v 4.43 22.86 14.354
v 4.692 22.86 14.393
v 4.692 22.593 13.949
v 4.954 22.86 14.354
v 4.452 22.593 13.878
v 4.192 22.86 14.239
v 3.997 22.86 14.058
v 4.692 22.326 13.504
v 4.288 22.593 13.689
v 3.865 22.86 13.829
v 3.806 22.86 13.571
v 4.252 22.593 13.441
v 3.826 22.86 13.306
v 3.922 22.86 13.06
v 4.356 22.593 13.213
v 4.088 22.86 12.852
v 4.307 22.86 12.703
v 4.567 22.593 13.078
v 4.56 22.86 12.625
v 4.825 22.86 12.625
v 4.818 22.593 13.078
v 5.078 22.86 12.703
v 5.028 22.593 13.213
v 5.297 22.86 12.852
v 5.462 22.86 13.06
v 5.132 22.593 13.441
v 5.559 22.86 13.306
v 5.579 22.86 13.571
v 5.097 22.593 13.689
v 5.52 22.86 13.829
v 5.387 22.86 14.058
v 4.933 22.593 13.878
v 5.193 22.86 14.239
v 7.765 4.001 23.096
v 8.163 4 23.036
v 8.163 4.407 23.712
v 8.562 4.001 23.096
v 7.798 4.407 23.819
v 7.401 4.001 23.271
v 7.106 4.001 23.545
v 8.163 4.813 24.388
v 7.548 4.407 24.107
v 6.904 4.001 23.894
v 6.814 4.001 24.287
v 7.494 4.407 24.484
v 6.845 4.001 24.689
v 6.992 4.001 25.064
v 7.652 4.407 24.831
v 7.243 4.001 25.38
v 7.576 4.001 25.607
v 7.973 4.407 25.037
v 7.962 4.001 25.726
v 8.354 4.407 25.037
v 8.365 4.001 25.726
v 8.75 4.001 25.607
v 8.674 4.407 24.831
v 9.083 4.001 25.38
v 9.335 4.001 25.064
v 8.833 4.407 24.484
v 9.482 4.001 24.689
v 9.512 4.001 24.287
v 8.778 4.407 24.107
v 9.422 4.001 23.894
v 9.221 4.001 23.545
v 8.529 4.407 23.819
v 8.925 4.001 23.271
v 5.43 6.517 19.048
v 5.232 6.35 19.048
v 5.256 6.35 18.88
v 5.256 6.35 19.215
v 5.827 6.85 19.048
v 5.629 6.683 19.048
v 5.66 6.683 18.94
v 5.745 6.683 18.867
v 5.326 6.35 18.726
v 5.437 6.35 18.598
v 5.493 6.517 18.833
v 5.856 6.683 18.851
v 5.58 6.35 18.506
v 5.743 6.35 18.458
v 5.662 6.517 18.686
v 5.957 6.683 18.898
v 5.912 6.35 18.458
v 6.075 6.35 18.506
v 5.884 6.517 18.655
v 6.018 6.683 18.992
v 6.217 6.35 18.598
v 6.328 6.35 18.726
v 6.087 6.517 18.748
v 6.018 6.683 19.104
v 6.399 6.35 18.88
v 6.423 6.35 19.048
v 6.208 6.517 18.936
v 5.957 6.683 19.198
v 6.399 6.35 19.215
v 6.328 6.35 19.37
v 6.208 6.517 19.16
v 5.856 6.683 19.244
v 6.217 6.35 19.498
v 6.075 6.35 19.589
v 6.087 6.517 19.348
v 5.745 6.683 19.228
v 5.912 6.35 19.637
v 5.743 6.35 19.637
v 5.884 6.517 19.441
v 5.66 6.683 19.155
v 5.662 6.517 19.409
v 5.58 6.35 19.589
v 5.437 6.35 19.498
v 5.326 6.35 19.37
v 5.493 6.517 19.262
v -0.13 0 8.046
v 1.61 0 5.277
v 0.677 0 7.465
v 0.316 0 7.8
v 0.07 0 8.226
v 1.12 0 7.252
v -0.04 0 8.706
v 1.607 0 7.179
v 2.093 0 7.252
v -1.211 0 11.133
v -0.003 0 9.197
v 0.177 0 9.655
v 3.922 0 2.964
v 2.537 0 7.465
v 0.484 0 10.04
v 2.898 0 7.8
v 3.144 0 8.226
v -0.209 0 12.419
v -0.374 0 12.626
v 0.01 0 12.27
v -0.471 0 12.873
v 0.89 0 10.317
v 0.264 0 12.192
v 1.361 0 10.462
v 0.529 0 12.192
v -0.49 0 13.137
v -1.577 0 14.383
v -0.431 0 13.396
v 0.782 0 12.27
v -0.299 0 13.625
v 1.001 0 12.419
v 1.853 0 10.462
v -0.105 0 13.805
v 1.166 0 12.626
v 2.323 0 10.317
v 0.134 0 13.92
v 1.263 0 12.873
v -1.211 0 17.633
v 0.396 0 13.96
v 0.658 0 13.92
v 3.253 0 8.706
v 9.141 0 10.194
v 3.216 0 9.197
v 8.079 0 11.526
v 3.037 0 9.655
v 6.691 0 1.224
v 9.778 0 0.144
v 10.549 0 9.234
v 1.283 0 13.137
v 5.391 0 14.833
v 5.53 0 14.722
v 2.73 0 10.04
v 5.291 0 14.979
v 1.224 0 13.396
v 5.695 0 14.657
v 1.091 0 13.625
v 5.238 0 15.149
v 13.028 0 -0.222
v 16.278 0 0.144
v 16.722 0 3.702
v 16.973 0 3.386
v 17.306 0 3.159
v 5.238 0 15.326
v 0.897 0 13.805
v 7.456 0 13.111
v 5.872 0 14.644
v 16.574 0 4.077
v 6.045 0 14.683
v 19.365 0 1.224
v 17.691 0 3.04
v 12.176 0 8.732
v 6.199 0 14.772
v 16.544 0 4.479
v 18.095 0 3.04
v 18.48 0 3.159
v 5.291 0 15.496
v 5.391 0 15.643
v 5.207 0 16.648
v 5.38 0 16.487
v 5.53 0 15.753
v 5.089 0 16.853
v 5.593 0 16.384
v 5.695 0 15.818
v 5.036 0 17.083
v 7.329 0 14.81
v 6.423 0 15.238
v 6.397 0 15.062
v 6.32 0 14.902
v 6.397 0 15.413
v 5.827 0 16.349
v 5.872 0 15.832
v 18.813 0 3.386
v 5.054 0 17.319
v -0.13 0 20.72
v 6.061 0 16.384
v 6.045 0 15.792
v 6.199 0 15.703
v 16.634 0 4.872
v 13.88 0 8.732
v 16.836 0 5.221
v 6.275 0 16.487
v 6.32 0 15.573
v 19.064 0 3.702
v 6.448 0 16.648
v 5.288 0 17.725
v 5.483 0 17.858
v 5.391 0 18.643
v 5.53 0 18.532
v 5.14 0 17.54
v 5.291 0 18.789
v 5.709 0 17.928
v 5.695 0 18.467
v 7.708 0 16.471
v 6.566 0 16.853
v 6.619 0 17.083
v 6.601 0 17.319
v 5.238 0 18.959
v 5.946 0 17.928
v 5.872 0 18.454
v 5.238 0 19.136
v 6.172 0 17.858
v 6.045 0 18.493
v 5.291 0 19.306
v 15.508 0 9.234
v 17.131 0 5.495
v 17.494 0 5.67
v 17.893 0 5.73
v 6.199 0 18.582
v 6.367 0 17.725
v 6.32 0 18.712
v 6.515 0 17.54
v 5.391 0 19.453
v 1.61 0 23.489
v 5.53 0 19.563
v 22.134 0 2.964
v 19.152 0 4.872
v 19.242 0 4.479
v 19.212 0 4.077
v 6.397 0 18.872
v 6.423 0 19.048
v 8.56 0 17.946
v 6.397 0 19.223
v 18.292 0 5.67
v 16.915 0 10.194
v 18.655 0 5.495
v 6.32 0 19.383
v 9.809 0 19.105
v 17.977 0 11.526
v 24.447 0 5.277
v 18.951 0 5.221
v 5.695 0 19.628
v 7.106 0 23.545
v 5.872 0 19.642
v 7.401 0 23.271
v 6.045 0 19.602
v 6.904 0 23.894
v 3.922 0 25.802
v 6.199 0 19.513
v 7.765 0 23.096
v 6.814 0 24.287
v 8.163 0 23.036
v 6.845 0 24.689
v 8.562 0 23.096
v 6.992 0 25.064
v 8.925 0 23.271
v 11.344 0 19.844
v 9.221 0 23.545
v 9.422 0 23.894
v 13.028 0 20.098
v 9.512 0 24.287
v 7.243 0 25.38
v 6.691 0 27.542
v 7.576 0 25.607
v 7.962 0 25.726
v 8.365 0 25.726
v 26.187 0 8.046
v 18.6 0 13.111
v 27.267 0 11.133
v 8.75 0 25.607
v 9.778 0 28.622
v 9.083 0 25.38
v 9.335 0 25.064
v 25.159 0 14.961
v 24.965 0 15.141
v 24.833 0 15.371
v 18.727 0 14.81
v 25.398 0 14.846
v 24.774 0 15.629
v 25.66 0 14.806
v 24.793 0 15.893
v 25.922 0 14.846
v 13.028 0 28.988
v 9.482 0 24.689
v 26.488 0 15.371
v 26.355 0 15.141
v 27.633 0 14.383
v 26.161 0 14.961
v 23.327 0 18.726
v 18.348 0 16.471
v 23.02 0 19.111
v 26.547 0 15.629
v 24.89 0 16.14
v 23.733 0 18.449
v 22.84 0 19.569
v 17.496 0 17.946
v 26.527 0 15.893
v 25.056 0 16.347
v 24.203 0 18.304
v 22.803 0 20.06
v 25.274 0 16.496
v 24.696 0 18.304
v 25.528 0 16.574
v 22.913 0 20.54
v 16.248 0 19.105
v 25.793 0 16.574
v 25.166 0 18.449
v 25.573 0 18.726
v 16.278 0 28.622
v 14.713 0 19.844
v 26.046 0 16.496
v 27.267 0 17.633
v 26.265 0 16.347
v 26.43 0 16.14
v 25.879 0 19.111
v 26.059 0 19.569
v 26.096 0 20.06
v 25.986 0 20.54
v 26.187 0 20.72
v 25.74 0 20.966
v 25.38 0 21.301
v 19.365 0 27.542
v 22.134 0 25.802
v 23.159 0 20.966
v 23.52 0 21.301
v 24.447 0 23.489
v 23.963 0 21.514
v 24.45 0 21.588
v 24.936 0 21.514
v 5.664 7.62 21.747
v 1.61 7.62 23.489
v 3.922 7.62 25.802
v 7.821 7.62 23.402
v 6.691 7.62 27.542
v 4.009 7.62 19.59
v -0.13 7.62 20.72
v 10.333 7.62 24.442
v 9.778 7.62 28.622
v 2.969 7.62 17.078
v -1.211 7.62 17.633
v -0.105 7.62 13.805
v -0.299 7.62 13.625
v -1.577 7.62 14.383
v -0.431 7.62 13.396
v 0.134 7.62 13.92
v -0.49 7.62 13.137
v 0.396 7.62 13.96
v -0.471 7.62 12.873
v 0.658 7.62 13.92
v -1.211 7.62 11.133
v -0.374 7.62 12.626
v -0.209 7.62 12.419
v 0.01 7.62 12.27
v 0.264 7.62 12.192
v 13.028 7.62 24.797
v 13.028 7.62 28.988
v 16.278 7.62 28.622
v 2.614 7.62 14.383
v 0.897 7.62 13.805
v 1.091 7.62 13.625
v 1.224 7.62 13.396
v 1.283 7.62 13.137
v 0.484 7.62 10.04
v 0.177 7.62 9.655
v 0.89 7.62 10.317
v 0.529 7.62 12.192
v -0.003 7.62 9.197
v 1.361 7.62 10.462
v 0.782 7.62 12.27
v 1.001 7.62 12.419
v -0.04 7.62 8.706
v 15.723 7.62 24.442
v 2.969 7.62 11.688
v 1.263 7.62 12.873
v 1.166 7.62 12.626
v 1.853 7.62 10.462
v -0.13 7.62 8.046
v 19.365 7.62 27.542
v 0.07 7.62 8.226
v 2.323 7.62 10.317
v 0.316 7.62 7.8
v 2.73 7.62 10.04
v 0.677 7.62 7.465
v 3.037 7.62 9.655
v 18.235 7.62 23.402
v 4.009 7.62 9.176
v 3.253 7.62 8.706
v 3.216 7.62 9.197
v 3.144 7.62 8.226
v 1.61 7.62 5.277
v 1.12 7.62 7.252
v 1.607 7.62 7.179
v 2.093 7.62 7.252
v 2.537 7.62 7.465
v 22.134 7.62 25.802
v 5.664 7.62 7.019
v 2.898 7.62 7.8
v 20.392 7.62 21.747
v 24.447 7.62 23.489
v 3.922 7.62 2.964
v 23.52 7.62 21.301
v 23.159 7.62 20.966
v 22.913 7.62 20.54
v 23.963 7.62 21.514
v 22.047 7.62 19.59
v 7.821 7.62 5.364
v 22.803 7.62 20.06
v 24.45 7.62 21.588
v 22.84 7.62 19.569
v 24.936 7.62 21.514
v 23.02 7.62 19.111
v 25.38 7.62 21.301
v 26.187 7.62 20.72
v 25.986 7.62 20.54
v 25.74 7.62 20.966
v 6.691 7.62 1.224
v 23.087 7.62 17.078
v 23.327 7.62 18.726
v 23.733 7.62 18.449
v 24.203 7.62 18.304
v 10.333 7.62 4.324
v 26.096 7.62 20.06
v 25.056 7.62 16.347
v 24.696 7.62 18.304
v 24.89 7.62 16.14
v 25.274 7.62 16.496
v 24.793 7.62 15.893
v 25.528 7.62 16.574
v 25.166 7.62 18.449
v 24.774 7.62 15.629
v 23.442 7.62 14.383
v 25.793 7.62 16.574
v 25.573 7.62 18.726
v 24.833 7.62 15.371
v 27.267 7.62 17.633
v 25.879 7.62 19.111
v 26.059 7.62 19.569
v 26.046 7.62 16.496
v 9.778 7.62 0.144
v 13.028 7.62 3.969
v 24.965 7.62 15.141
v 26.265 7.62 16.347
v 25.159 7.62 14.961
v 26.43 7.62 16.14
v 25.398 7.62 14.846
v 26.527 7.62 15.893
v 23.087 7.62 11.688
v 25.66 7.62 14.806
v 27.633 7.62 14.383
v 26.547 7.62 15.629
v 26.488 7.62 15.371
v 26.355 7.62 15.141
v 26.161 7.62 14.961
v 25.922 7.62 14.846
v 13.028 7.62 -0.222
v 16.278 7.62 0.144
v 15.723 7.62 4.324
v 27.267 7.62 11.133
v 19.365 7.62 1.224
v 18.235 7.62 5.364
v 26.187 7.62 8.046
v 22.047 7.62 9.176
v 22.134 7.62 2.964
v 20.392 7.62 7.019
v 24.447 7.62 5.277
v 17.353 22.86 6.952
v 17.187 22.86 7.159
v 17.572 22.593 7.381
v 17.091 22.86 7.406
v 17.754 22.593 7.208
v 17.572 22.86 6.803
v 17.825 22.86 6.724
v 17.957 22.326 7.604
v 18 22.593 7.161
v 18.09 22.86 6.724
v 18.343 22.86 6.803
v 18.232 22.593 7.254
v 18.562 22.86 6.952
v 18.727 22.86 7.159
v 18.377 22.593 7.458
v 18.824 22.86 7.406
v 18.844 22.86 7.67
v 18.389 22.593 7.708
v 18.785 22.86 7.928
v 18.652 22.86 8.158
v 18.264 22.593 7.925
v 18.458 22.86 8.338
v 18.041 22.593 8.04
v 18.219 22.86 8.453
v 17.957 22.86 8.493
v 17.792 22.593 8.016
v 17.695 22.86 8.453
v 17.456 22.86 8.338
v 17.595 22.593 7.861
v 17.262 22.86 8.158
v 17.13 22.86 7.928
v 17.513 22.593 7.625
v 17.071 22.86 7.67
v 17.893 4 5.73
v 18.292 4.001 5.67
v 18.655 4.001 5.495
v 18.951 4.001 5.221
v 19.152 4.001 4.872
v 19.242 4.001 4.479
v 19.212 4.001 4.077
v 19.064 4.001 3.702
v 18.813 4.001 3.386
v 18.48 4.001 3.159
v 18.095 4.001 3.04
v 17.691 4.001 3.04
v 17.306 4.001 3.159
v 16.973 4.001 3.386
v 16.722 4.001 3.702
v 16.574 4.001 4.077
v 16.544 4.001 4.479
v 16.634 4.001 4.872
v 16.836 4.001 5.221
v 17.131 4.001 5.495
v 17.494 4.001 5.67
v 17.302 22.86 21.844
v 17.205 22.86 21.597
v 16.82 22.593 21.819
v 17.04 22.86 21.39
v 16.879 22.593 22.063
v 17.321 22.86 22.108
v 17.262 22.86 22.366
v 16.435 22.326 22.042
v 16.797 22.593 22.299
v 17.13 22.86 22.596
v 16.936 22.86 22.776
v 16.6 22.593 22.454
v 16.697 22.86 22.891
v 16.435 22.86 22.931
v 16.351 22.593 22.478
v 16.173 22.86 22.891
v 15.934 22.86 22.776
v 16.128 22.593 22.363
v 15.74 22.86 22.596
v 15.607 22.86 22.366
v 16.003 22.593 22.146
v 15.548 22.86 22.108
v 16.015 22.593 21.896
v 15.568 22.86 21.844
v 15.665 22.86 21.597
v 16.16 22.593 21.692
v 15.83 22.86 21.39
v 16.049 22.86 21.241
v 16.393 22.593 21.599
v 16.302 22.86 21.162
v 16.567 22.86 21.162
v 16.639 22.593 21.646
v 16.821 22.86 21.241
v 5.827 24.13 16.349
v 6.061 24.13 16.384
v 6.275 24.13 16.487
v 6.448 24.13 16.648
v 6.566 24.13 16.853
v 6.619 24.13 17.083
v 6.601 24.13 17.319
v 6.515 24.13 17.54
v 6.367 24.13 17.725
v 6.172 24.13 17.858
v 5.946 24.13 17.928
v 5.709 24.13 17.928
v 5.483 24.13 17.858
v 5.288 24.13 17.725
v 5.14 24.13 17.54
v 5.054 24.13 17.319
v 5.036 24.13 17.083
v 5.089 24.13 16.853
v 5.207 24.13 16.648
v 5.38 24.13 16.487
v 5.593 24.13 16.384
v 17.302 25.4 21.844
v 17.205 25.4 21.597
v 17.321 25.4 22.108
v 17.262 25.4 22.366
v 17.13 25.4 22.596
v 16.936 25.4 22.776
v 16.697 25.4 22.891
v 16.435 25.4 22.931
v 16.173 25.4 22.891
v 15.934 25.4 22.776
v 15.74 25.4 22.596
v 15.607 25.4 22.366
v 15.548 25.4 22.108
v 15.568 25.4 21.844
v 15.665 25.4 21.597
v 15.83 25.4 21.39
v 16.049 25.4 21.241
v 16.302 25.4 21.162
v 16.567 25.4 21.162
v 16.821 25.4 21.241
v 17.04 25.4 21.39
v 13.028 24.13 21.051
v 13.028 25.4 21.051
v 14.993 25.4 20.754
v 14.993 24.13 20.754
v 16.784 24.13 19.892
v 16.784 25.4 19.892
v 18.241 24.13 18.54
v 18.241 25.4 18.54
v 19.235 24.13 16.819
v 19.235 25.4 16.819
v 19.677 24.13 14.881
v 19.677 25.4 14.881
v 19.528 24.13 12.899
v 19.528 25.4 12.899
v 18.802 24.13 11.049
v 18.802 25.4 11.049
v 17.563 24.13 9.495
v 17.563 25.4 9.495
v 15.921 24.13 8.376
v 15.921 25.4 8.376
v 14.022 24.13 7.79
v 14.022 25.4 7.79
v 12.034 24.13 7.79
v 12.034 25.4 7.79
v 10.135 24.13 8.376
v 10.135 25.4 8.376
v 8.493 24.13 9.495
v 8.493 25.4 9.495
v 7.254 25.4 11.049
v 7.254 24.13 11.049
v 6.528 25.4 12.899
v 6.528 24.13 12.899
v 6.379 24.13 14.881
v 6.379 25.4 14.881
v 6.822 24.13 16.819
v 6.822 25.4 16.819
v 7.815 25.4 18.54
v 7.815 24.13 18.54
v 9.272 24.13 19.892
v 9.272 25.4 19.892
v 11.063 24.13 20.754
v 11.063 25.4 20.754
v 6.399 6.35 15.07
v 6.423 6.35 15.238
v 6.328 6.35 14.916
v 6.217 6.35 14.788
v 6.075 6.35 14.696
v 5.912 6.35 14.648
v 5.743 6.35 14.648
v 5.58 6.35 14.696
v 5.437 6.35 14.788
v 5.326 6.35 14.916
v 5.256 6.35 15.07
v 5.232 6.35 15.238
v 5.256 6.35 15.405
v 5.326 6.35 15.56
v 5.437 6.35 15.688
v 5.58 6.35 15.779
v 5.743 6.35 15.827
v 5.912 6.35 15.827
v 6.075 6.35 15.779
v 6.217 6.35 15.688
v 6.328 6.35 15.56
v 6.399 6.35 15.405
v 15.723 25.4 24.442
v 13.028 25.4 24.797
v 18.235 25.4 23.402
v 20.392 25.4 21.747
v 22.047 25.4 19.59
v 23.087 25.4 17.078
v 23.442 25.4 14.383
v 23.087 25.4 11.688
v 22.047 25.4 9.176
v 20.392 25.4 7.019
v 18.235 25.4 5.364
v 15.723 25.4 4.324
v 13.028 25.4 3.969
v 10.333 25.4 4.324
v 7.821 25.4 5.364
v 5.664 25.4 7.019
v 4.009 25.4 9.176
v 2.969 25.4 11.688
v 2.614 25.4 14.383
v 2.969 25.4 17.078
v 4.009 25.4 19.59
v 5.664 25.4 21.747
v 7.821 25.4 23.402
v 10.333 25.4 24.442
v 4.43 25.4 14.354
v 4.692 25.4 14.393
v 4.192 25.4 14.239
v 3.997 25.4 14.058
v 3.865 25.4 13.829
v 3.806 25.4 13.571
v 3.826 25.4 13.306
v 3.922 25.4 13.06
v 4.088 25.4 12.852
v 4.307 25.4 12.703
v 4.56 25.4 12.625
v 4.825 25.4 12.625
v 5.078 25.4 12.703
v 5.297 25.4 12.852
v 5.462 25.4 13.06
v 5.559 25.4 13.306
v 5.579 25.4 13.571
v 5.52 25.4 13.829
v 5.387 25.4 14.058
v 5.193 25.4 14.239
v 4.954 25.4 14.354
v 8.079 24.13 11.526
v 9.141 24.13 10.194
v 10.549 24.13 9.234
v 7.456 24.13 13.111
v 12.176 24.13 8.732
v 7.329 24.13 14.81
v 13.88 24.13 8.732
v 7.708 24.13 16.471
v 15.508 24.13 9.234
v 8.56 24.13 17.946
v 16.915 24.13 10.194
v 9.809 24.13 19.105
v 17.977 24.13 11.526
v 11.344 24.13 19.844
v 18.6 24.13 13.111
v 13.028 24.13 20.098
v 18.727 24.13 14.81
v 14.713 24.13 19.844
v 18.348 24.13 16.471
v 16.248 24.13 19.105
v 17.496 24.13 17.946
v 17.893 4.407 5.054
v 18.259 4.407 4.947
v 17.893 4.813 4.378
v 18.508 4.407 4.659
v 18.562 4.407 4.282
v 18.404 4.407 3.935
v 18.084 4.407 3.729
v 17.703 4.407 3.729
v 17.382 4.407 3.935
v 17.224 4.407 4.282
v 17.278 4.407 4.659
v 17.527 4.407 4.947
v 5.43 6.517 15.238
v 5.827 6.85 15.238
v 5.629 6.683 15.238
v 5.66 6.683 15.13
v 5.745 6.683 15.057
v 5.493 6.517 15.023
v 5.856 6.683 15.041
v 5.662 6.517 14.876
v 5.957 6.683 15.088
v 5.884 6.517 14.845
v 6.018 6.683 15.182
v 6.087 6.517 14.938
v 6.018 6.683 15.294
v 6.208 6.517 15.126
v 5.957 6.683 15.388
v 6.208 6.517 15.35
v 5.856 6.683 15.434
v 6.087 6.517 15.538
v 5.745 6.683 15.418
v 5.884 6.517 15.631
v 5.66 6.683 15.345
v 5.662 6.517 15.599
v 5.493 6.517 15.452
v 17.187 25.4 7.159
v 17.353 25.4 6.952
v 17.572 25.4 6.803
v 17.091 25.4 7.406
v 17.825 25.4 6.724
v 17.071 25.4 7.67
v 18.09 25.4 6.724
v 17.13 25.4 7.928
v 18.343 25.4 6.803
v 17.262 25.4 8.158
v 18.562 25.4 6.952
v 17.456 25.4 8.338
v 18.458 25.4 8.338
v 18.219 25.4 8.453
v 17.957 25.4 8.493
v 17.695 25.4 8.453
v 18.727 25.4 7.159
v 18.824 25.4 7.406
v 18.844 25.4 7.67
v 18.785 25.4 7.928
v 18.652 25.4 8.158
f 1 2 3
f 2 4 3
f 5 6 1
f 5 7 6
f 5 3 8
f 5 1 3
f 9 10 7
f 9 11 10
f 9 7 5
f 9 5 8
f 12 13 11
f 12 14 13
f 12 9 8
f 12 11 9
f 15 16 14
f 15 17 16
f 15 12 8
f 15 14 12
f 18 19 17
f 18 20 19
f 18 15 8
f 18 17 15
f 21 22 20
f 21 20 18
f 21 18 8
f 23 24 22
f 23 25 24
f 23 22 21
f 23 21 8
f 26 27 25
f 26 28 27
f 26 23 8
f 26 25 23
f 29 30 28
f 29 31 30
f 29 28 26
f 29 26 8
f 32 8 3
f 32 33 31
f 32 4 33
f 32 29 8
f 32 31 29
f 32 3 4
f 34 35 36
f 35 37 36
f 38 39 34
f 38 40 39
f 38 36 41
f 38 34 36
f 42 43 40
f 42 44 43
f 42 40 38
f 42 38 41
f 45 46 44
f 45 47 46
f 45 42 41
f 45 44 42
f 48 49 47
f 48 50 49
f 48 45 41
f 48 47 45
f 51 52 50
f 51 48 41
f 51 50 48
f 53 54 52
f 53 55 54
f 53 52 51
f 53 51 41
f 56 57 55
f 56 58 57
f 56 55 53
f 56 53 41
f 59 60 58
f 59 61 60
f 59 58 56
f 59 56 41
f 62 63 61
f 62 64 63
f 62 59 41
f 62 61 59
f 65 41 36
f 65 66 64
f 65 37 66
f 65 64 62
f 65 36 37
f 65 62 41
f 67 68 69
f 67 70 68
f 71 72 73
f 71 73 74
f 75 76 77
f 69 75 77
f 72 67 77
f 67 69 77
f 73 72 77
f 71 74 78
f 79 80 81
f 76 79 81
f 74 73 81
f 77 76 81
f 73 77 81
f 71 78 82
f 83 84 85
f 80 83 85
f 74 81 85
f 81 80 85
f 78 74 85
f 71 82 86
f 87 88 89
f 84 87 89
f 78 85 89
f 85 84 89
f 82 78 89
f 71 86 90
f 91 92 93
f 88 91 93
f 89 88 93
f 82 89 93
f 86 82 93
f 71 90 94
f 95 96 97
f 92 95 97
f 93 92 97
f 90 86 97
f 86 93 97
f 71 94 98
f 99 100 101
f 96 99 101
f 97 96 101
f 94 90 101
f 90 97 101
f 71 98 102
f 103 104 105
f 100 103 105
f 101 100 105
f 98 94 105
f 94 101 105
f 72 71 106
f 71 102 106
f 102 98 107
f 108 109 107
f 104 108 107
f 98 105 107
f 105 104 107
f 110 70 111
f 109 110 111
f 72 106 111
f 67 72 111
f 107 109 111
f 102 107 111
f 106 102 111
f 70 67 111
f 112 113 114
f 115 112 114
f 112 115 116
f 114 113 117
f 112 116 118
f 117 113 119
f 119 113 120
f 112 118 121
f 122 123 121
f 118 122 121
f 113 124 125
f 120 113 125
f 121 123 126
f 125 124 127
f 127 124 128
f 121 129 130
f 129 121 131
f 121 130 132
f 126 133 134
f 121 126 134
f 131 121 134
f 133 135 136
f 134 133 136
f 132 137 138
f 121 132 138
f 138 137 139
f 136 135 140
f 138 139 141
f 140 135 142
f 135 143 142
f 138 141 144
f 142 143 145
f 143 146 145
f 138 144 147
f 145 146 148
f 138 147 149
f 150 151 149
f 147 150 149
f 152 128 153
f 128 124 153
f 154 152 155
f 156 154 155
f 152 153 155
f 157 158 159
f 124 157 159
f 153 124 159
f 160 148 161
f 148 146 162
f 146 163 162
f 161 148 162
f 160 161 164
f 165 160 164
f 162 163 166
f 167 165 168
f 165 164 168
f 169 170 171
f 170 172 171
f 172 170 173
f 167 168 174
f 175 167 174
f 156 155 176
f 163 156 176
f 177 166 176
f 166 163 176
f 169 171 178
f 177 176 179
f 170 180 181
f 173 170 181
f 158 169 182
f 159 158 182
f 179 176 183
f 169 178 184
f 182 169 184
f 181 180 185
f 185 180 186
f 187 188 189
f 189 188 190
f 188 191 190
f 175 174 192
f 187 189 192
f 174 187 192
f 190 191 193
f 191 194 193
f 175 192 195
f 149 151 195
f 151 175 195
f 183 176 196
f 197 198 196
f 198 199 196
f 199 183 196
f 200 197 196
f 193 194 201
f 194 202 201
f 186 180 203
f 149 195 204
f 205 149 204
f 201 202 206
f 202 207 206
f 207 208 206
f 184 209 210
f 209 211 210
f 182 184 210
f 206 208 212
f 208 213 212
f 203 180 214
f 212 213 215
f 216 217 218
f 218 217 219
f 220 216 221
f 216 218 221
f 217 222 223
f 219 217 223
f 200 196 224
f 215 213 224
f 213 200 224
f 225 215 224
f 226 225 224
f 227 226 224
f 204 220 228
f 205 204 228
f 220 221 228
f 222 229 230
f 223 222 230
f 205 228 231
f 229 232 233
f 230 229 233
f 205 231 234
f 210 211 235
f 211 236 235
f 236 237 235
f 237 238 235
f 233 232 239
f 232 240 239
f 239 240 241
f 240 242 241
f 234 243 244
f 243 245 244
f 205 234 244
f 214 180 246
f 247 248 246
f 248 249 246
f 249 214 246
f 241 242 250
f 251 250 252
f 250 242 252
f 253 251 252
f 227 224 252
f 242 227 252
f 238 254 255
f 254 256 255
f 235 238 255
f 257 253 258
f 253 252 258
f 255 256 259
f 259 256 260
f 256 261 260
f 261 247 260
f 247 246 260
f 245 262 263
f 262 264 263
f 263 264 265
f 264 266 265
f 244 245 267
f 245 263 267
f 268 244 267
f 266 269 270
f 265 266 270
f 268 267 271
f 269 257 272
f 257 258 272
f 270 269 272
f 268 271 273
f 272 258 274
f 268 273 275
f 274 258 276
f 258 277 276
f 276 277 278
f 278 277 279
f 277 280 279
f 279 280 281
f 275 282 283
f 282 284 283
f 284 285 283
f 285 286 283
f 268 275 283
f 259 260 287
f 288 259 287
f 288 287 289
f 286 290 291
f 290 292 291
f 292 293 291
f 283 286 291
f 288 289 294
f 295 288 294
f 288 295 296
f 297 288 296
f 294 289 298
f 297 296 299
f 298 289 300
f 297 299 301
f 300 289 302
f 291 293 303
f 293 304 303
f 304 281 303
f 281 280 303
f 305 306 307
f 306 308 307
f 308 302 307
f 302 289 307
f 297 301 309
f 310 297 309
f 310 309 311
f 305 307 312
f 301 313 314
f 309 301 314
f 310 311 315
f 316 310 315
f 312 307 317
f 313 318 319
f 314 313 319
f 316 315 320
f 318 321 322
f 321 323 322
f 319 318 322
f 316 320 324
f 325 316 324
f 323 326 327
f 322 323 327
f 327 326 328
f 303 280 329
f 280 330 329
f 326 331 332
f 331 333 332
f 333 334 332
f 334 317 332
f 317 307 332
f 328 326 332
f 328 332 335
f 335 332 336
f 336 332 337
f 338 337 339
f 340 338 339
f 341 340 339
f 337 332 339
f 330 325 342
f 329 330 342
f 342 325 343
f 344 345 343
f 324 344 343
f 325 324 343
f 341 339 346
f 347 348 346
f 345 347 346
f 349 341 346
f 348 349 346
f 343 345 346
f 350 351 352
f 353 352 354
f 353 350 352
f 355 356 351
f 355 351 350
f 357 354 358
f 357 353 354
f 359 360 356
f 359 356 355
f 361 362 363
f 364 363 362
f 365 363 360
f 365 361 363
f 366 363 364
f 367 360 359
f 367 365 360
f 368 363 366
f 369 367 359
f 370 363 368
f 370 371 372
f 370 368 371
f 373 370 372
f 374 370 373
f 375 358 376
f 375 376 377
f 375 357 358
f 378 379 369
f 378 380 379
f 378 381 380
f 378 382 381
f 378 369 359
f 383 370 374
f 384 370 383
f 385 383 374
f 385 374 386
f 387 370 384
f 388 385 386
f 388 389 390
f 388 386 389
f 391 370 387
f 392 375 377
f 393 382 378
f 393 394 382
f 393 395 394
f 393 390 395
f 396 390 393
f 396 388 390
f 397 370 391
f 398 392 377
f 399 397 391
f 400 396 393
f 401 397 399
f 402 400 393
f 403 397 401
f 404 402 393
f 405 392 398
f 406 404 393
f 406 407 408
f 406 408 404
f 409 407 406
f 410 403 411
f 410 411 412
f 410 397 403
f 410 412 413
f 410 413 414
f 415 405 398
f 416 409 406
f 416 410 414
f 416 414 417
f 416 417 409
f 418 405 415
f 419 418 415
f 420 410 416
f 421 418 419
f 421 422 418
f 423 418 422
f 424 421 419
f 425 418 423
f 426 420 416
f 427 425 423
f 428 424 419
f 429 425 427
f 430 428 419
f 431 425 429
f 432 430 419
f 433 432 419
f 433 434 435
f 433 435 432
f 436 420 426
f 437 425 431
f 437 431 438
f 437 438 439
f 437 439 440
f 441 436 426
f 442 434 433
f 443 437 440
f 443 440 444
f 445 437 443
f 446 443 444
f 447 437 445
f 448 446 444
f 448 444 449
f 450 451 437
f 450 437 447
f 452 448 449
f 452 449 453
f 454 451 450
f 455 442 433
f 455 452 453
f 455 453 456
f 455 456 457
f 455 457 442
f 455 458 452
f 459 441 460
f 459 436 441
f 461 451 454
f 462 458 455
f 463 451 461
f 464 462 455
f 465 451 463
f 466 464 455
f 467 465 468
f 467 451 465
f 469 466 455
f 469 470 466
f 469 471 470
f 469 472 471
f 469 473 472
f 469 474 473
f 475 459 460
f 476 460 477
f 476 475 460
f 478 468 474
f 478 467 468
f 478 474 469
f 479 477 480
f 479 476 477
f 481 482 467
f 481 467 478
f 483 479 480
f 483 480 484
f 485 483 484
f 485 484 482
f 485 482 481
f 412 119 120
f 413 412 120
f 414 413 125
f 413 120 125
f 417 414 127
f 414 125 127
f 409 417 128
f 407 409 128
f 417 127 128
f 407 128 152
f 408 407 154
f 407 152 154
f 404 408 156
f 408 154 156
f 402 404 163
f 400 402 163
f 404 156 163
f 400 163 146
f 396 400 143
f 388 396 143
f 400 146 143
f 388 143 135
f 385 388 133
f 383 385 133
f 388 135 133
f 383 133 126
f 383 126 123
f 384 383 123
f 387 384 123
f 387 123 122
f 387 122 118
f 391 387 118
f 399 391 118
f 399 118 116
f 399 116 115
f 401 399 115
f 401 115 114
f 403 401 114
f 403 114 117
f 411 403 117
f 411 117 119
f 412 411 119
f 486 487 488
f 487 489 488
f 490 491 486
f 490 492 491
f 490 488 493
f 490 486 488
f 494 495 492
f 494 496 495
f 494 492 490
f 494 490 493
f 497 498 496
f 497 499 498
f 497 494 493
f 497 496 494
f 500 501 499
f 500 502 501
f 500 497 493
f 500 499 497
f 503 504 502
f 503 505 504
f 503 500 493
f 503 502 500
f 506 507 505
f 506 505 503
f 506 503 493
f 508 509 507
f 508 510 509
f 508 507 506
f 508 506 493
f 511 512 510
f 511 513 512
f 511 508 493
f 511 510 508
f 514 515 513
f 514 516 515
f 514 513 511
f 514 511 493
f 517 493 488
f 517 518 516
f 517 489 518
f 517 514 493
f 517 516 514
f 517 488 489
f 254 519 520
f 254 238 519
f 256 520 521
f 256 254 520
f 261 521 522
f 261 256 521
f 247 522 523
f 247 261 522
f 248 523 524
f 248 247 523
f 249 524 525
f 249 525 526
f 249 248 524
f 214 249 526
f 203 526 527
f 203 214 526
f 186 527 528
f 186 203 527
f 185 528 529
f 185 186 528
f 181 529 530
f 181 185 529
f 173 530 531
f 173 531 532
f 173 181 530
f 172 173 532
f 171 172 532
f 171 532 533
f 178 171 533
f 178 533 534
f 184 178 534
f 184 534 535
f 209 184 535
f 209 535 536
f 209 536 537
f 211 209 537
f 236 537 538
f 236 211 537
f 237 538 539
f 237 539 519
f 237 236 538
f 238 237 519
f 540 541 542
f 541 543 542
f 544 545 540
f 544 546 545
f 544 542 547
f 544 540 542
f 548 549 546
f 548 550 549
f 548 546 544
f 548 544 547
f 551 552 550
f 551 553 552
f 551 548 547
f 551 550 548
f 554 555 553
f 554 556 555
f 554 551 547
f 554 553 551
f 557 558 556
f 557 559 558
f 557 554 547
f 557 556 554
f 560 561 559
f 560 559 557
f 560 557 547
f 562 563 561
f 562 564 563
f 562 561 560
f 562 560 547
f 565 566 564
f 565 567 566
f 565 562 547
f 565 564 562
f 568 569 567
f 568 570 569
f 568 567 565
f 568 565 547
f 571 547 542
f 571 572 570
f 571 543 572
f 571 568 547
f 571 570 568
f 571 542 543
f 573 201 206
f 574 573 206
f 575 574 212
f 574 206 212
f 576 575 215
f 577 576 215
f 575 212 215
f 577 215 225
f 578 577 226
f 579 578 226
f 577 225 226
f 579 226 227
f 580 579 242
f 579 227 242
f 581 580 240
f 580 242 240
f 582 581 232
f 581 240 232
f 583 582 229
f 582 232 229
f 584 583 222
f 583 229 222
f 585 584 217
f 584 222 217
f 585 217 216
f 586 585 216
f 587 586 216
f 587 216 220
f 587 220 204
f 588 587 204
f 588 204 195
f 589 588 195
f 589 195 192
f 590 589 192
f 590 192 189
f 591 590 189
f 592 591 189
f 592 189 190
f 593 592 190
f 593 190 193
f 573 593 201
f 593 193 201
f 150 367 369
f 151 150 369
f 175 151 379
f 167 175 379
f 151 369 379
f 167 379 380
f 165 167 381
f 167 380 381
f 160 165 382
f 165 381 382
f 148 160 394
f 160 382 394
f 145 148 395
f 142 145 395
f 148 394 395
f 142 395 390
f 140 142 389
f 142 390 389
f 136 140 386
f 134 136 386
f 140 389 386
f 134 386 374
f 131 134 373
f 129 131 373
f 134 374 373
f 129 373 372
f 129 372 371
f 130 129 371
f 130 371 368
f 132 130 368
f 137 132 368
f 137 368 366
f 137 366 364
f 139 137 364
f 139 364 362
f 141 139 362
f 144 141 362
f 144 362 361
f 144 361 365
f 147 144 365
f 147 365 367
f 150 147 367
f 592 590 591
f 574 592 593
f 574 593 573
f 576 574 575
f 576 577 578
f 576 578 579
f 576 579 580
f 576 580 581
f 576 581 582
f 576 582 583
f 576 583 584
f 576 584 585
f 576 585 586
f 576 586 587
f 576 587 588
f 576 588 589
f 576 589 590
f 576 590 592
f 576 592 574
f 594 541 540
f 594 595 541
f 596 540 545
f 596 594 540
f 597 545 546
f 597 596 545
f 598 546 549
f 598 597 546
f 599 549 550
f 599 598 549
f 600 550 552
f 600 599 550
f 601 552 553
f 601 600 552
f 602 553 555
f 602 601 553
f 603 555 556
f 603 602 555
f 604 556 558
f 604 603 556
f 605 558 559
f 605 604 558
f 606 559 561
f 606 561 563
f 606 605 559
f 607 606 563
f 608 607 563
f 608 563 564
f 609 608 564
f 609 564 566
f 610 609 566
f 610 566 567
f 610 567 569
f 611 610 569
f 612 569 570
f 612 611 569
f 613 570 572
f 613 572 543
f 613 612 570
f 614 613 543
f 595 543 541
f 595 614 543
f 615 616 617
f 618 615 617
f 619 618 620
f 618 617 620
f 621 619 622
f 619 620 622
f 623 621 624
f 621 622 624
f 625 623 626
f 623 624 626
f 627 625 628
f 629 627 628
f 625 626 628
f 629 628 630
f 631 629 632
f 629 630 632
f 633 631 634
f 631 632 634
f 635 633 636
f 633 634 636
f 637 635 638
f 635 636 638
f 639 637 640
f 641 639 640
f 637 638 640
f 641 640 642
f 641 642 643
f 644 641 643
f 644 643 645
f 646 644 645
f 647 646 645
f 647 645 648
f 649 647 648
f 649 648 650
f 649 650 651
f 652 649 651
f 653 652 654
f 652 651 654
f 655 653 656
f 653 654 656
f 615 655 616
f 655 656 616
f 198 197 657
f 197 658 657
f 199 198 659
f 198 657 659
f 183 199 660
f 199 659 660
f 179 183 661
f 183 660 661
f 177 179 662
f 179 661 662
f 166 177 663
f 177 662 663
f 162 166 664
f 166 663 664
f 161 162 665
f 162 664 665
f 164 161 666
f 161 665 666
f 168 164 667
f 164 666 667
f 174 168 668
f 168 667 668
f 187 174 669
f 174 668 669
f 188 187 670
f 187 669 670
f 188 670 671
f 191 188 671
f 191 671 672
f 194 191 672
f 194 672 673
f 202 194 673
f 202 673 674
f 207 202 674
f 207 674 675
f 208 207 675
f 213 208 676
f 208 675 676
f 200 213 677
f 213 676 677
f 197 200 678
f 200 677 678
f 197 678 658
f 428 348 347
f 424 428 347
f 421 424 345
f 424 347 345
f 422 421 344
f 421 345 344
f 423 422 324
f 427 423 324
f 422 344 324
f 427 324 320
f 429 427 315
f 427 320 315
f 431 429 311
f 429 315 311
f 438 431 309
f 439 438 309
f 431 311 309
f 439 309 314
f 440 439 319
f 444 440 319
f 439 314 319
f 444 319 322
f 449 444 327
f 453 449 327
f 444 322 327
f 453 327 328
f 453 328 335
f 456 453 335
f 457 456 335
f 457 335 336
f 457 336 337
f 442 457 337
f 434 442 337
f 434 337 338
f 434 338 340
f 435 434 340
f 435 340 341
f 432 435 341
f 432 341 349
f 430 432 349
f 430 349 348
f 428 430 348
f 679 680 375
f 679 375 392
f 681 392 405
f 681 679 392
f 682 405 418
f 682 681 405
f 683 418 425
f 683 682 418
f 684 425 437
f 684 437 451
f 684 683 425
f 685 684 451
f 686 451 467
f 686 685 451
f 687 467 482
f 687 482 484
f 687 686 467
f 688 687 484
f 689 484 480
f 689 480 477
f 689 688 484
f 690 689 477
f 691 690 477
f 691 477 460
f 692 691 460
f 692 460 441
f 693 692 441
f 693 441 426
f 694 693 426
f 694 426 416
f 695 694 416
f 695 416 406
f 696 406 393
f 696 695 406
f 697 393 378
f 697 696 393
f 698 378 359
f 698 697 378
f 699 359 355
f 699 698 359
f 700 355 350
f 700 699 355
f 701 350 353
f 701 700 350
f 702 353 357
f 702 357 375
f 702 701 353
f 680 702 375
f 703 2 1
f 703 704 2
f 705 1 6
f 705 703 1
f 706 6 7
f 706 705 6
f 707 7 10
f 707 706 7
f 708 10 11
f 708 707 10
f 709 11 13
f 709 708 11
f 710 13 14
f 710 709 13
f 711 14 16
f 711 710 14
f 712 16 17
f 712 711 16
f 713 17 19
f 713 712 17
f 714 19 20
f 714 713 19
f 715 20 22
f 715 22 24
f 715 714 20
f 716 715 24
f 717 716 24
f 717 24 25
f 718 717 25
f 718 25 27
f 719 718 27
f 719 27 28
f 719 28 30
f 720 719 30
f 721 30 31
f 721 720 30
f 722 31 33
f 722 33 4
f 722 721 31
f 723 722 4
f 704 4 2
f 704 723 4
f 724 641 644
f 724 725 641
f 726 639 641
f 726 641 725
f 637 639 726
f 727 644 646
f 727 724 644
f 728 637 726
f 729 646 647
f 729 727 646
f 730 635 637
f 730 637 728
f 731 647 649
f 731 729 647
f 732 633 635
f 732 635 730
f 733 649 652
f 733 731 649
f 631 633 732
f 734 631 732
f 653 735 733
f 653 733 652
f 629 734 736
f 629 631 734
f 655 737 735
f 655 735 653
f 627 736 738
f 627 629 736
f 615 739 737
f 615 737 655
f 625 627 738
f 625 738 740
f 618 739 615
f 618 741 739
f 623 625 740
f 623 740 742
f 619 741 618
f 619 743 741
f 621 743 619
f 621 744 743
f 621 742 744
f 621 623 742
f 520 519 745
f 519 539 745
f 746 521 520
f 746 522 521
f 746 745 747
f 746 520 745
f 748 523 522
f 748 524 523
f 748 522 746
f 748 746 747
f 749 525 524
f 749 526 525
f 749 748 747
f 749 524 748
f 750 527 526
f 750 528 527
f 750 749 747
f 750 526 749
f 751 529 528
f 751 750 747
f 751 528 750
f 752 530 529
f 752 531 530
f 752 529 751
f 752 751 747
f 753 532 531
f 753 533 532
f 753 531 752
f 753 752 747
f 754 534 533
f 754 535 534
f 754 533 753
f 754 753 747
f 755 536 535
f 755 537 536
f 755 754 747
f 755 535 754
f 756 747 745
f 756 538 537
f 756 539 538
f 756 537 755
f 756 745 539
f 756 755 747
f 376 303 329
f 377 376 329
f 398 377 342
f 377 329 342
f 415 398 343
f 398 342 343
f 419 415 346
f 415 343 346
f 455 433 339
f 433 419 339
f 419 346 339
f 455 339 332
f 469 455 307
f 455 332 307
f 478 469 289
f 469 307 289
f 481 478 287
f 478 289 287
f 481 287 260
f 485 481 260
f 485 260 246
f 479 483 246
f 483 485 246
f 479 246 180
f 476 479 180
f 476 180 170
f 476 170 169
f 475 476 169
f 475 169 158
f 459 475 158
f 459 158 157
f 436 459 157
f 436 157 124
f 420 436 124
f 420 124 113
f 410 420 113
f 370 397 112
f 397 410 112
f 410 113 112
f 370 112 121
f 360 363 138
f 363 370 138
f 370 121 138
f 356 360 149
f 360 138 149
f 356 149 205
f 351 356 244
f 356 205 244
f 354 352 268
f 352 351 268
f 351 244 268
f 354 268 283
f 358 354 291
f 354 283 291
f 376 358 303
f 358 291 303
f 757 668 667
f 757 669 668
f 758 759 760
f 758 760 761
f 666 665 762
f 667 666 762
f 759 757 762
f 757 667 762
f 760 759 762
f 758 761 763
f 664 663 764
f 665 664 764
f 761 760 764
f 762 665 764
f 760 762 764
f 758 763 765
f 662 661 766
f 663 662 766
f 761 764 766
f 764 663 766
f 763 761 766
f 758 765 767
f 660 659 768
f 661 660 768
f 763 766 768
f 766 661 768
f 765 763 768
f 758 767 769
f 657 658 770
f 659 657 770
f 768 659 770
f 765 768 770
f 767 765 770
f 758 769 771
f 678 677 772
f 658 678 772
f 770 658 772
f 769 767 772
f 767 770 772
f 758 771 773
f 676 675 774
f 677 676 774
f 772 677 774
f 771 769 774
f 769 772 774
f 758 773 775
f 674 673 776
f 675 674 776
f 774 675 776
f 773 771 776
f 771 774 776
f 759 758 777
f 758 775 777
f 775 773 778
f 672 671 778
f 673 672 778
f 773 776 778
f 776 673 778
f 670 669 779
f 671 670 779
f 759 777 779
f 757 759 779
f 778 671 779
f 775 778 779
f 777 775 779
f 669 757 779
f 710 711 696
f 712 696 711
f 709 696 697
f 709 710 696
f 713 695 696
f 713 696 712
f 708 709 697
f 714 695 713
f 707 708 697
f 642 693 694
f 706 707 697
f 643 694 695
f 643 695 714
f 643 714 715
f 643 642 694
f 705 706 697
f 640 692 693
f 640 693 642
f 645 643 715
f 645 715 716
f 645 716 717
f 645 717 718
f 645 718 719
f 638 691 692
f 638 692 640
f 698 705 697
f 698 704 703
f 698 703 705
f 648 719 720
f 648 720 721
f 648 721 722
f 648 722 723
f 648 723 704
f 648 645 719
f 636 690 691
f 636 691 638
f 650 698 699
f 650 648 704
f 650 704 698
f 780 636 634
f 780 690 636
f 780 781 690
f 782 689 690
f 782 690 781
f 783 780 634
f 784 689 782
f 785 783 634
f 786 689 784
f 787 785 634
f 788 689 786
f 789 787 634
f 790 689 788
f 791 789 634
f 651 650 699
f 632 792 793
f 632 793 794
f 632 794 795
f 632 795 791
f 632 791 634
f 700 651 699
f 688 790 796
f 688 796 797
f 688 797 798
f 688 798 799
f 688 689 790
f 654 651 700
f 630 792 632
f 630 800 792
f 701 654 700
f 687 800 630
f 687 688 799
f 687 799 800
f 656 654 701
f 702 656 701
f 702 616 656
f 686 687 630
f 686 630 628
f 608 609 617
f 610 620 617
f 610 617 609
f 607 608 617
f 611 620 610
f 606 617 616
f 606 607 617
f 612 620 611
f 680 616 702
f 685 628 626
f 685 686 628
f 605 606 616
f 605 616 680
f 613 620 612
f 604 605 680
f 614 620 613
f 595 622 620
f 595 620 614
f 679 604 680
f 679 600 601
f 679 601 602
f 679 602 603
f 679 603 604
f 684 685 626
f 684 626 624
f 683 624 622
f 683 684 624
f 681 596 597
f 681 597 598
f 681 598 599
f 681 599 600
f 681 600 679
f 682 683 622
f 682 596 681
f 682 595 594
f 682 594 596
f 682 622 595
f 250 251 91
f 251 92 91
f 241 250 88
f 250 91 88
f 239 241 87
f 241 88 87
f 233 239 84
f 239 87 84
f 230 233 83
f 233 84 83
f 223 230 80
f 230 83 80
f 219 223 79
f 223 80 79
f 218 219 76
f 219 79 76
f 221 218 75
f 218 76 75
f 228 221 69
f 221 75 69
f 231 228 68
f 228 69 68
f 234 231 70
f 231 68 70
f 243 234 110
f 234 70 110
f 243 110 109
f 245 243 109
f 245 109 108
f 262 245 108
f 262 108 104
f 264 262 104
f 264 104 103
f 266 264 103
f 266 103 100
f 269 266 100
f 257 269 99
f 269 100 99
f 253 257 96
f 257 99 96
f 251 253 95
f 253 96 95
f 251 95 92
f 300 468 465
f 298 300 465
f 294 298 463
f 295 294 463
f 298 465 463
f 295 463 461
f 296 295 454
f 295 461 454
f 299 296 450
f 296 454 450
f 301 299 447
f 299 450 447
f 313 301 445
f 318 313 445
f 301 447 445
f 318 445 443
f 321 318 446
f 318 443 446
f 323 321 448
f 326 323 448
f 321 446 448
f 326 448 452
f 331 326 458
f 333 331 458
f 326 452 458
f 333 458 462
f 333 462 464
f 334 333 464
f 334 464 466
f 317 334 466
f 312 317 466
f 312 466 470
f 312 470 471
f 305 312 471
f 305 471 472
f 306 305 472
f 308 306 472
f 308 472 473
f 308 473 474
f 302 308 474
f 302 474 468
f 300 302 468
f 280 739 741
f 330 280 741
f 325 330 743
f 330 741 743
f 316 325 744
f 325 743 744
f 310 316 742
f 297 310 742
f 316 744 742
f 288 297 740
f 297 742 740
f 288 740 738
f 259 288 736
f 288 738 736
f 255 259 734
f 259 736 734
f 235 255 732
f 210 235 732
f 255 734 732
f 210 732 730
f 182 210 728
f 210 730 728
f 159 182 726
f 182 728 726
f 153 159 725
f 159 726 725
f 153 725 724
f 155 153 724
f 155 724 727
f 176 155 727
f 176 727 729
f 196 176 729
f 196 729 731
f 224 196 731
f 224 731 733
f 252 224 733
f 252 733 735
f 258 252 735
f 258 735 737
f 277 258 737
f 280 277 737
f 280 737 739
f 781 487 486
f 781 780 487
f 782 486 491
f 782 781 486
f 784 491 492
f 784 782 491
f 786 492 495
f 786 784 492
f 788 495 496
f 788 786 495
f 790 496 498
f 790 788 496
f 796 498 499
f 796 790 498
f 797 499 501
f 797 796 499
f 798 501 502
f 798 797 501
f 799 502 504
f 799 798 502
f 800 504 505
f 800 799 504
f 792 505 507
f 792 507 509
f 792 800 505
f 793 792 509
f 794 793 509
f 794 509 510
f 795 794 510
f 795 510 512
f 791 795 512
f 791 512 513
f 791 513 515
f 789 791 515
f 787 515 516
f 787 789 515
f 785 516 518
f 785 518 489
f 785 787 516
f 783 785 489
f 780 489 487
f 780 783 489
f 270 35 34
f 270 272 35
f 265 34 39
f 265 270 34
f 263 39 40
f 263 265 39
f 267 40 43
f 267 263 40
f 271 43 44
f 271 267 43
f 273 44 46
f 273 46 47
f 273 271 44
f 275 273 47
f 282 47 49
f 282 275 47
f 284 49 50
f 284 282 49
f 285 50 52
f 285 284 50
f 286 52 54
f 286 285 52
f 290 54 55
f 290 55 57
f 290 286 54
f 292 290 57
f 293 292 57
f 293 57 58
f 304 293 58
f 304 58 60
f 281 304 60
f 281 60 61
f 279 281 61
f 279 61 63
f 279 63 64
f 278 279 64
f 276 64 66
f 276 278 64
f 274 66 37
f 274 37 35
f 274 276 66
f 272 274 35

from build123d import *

# Parameters (mm, degrees)
SKETCH1_R                     = 14.605
BOSS_EXTRUDE2_DEPTH           = 25.4
SKETCH10_R                    = 5.715
CUT_EXTRUDE5_DEPTH            = 48.424233935
SKETCH11_R                    = 6.6675
CUT_EXTRUDE6_DEPTH            = 1.27
SKETCH12_OUTSIDE_W            = 40.908
SKETCH12_OUTSIDE_H            = 40.908
SKETCH12_OUTSIDE_R            = 10.414
CUT_EXTRUDE7_DEPTH            = 17.78
CIRPATTERN1_COUNT             = 3
CIRPATTERN2_COUNT             = 2
SKETCH26_R                    = 1.651
CUT_EXTRUDE8_DEPTH            = 8.89
CIRPATTERN3_COUNT             = 2
SKETCH27_R                    = 0.79375
CUT_EXTRUDE9_DEPTH            = 24.13
TAP_DRILL_FOR_0_80_TAP3_D     = 1.19126
TAP_DRILL_FOR_0_80_TAP3_DEPTH = 6.35
TAP_DRILL_FOR_0_80_TAP3_TIP   = 0.499792913
TAP_DRILL_FOR_2_56_TAP1_D     = 1.778
CIRPATTERN4_COUNT             = 2


with BuildPart() as part:
    # Sketch1 → Boss-Extrude2 (new body)
    with BuildSketch(Plane(origin=(0, 0, 0), x_dir=(1, 0, 0), z_dir=(0, 1, 0))):
        with Locations(Location((13.028153923, -14.383045271, 0), (0, 0, 270))):
            Circle(SKETCH1_R)
    extrude(amount=BOSS_EXTRUDE2_DEPTH)

    # Sketch10 → Cut-Extrude5 (cut, through all)
    with BuildSketch(Plane(origin=(0, 25.4, 0), x_dir=(1, 0, 0), z_dir=(0, 1, 0))):
        with Locations(Location((13.028153923, -14.383045271, 0), (0, 0, 270))):
            Circle(SKETCH10_R)
    extrude(amount=-CUT_EXTRUDE5_DEPTH, mode=Mode.SUBTRACT)

    # Sketch11 → Cut-Extrude6 (cut)
    with BuildSketch(Plane(origin=(0, 25.4, 0), x_dir=(1, 0, 0), z_dir=(0, 1, 0))):
        with Locations(Location((13.028153923, -14.383045271, 0), (0, 0, 270))):
            Circle(SKETCH11_R)
    extrude(amount=-CUT_EXTRUDE6_DEPTH, mode=Mode.SUBTRACT)

    # Sketch12 outside → Cut-Extrude7 (cut)
    with BuildSketch(Plane(origin=(0, 25.4, 0), x_dir=(1, 0, 0), z_dir=(0, 1, 0))):
        with Locations((13.028, -14.383)):
            Rectangle(SKETCH12_OUTSIDE_W, SKETCH12_OUTSIDE_H)
        with Locations(Location((13.028153923, -14.383045271, 0), (0, 0, 270))):
            Circle(SKETCH12_OUTSIDE_R, mode=Mode.SUBTRACT)
    extrude(amount=-CUT_EXTRUDE7_DEPTH, mode=Mode.SUBTRACT)

    # Sketch17 → #50 (0.07) Diameter Hole1 (revolve, cut)
    with BuildSketch(Plane(origin=(4.692367215, 25.4, 13.504077717), x_dir=(0, 0, 1), z_dir=(1, 0, 0))):
        Polygon((0, 0), (0, 3.07416509), (0.889, 2.54), (0.889, 0), align=None)
    f_50_0_07_diameter_hole1 = revolve(axis=Axis((4.692367215, 31.75, 13.504077717), (0, -1, 0)), mode=Mode.SUBTRACT)

    # CirPattern1: #50 (0.07) Diameter Hole1 ×3 about axis
    cirpattern1_axis = Axis((13.028153923, 0, 14.383045271), (0, 1, 0))
    for i in range(1, CIRPATTERN1_COUNT):
        add(f_50_0_07_diameter_hole1.rotate(cirpattern1_axis, i * 360 / CIRPATTERN1_COUNT), mode=Mode.SUBTRACT)

    # Sketch24 → Tap Drill for #6-32 Tap1 (revolve, cut)
    with BuildSketch(Plane(origin=(8.163266455, 0, 24.388191195), x_dir=(0, 0, -1), z_dir=(1, 0, 0))):
        Polygon((0, 0), (0, 4.81319403), (1.35255, 4.0005), (1.35255, 0), align=None)
    tap_drill_for_6_32_tap1 = revolve(axis=Axis((8.163266455, -6.35, 24.388191195), (0, 1, 0)), mode=Mode.SUBTRACT)

    # CirPattern2: Tap Drill for #6-32 Tap1 ×2 about axis
    cirpattern2_axis = Axis((13.028153923, 0, 14.383045271), (0, 1, 0))
    for i in range(1, CIRPATTERN2_COUNT):
        add(tap_drill_for_6_32_tap1.rotate(cirpattern2_axis, i * 360 / CIRPATTERN2_COUNT), mode=Mode.SUBTRACT)

    # Sketch26 → Cut-Extrude8 (cut)
    with BuildSketch(Plane(origin=(0, 0, 0), x_dir=(-1, 0, 0), z_dir=(0, -1, 0))):
        with Locations(Location((-1.606754466, -8.829520764, 0), (0, 0, 90))):
            Circle(SKETCH26_R)
    cut_extrude8 = extrude(amount=-CUT_EXTRUDE8_DEPTH, mode=Mode.SUBTRACT)

    # CirPattern3: Cut-Extrude8 ×2 about axis
    cirpattern3_axis = Axis((13.028153923, 0, 14.383045271), (0, 1, 0))
    for i in range(1, CIRPATTERN3_COUNT):
        add(cut_extrude8.rotate(cirpattern3_axis, i * 360 / CIRPATTERN3_COUNT), mode=Mode.SUBTRACT)

    # Sketch27 → Cut-Extrude9 (cut)
    with BuildSketch(Plane(origin=(0, 0, 0), x_dir=(-1, 0, 0), z_dir=(0, -1, 0))):
        with Locations(Location((-5.827402564, -17.142659866, 0), (0, 0, 90))):
            Circle(SKETCH27_R)
    extrude(amount=-CUT_EXTRUDE9_DEPTH, mode=Mode.SUBTRACT)

    # Tap Drill for #0-80 Tap3
    with Locations(Plane(origin=(0, 0, 0), x_dir=(-1, 0, 0), z_dir=(0, -1, 0))):
        with Locations((-5.827402564, -15.237659866), (-5.827402564, -19.047659866)):
            Hole(TAP_DRILL_FOR_0_80_TAP3_D / 2, depth=TAP_DRILL_FOR_0_80_TAP3_DEPTH)
            with Locations((0, 0, -(TAP_DRILL_FOR_0_80_TAP3_DEPTH + TAP_DRILL_FOR_0_80_TAP3_TIP / 2))):  # 100° drill point
                Cone(0, TAP_DRILL_FOR_0_80_TAP3_D / 2, TAP_DRILL_FOR_0_80_TAP3_TIP, mode=Mode.SUBTRACT)

    # Tap Drill for #2-56 Tap1 (through all)
    with Locations(Plane(origin=(0.396131886, 0, 13.070787952), x_dir=(0, 0, -1), z_dir=(0, -1, 0))):
        with Locations((0, 0)):
            tap_drill_for_2_56_tap1 = Hole(TAP_DRILL_FOR_2_56_TAP1_D / 2)

    # CirPattern4: Tap Drill for #2-56 Tap1 ×2 about axis
    cirpattern4_axis = Axis((13.028153923, 0, 14.383045271), (0, 1, 0))
    for i in range(1, CIRPATTERN4_COUNT):
        add(tap_drill_for_2_56_tap1.rotate(cirpattern4_axis, i * 360 / CIRPATTERN4_COUNT), mode=Mode.SUBTRACT)


solid = part.part
